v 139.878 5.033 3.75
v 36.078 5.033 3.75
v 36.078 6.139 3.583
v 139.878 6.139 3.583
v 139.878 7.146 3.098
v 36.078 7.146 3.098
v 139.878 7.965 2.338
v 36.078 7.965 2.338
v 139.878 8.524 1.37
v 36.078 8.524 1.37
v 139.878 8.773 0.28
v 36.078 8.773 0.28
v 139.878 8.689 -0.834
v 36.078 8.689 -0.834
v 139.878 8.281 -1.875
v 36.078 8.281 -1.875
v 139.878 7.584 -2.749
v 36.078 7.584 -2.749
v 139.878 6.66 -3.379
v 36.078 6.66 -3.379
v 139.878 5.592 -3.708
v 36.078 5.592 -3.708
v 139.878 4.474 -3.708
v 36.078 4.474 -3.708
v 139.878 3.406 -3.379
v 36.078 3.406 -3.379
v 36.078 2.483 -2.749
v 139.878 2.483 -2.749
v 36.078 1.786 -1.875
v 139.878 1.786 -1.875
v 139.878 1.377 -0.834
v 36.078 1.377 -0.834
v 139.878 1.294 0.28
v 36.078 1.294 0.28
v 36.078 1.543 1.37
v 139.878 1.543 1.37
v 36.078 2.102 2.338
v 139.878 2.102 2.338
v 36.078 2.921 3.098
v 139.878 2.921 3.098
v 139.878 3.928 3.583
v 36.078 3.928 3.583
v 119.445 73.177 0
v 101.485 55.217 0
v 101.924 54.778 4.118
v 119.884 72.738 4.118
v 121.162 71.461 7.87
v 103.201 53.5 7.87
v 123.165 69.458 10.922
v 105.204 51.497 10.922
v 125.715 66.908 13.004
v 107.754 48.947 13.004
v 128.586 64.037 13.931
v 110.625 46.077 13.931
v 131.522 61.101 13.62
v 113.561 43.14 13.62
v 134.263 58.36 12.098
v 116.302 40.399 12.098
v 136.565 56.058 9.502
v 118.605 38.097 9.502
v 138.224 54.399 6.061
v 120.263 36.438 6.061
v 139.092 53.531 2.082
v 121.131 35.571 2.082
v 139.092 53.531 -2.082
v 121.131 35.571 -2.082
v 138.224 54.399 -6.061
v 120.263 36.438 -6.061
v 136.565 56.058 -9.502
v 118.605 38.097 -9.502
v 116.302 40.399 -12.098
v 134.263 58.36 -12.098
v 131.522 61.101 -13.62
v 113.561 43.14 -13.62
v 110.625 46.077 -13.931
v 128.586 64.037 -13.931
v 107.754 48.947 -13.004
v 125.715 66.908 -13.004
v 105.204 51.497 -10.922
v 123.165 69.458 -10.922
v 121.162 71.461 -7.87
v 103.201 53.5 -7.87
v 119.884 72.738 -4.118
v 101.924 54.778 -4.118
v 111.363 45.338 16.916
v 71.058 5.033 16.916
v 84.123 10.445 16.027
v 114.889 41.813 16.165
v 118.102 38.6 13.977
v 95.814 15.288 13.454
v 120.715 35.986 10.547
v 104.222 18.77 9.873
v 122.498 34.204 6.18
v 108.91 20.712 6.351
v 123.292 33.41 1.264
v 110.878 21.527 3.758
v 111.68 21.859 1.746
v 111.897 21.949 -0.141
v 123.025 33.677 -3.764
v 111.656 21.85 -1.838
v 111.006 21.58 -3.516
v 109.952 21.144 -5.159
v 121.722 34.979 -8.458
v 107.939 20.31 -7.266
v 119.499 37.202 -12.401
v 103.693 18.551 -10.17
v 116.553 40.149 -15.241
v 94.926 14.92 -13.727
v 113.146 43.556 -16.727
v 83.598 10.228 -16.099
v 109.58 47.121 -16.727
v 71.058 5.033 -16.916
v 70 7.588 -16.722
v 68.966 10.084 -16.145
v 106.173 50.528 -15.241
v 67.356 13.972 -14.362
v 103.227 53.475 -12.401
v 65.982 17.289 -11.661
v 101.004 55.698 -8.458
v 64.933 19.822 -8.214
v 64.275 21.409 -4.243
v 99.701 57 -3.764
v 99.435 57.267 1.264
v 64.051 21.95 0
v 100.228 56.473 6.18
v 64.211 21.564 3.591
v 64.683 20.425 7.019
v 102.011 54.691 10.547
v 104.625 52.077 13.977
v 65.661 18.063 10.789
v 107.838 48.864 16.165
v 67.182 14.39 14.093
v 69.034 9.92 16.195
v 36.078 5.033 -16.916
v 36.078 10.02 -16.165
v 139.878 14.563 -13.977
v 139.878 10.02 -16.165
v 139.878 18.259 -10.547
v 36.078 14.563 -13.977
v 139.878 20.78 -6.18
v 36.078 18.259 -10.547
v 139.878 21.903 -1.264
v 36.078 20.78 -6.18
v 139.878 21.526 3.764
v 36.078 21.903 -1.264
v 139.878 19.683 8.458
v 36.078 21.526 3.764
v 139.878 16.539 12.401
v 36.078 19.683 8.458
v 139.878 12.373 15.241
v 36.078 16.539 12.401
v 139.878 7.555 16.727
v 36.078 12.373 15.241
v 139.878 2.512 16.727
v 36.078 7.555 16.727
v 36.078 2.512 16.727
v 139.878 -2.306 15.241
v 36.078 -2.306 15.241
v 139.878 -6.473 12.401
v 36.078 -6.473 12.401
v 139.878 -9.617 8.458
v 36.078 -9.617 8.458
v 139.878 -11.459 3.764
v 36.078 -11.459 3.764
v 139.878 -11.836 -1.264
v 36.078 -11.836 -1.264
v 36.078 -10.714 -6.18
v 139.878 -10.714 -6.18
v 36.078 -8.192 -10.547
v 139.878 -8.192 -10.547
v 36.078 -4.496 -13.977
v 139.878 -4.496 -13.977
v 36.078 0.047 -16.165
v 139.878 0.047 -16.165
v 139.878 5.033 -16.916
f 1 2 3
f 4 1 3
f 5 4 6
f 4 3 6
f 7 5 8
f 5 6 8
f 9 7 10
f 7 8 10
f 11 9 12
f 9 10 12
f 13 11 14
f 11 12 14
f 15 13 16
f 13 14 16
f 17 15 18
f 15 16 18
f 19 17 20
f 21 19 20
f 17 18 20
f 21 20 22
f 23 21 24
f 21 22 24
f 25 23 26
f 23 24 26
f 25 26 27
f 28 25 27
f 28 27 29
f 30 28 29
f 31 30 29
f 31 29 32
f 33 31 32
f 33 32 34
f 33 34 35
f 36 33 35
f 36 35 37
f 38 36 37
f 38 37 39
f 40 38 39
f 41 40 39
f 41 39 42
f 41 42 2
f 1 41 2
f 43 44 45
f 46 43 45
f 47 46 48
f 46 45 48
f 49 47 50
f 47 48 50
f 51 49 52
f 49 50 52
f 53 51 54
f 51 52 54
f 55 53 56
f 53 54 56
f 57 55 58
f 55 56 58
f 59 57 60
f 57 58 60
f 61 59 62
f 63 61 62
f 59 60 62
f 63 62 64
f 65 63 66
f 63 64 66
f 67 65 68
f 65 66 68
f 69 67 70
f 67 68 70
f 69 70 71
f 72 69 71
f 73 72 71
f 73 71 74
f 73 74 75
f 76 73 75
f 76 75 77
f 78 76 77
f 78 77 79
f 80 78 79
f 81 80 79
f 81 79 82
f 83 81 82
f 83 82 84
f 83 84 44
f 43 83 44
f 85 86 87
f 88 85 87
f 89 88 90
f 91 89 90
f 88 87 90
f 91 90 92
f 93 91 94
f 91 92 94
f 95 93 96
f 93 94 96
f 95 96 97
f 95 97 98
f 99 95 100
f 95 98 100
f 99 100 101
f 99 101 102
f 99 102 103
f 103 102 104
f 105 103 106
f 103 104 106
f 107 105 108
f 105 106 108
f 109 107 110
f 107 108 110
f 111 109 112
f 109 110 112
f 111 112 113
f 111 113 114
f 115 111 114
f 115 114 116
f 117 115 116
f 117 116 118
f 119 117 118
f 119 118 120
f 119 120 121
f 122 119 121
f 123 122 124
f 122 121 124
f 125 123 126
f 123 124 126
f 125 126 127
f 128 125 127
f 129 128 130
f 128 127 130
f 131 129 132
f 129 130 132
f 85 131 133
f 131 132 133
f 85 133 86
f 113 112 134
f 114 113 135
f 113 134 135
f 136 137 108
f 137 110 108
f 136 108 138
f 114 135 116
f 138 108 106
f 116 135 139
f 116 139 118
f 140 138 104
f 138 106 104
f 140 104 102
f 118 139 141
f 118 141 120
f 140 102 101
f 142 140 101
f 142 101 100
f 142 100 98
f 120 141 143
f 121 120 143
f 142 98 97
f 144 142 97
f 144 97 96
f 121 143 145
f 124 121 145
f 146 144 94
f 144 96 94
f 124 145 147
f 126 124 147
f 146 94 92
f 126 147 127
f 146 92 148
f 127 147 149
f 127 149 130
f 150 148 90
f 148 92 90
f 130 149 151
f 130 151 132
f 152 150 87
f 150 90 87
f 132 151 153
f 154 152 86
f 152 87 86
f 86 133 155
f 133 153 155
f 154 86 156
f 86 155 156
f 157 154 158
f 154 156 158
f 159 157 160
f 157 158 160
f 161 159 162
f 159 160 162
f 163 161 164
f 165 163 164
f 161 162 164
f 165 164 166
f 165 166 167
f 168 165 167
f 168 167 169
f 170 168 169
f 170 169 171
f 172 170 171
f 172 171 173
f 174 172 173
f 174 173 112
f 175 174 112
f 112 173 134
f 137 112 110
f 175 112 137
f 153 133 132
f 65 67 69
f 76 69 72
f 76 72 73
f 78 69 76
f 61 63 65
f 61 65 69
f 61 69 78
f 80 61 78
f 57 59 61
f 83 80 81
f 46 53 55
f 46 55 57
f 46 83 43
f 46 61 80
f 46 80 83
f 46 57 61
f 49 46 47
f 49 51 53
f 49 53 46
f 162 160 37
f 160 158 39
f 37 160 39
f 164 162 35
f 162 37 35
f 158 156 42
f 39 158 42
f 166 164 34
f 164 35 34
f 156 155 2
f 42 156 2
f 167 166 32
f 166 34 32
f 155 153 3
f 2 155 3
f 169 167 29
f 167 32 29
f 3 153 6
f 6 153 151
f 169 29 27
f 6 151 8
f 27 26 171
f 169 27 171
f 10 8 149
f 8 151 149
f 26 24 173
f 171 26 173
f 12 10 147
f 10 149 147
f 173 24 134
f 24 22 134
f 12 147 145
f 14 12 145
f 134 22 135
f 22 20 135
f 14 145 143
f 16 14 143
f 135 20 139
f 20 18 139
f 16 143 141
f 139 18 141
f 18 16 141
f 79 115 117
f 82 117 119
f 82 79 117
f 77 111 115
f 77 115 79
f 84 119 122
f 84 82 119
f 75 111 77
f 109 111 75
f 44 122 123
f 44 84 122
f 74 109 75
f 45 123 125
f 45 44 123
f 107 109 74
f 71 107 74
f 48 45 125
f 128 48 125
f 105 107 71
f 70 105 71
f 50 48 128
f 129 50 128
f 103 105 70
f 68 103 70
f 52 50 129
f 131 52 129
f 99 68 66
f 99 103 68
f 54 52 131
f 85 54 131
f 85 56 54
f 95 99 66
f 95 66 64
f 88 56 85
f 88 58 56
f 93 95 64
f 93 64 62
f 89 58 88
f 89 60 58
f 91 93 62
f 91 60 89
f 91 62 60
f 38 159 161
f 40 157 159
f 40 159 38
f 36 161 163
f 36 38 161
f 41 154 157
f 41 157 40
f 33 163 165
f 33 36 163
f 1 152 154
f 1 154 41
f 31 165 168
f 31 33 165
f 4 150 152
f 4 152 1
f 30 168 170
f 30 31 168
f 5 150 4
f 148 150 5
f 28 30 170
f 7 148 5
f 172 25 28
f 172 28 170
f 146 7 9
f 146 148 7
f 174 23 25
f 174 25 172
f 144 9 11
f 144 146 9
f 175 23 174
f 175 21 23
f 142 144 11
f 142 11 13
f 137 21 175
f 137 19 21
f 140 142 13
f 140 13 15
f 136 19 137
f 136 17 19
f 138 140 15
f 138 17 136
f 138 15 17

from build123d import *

# Parameters (mm, degrees)
SKETCH1_R           = 28.194
BOSS_EXTRUDE1_DEPTH = 173
SKETCH5_R           = 28.194
BOSS_EXTRUDE3_DEPTH = 95
SKETCH7_R           = 6.25
CUT_EXTRUDE1_DEPTH  = 369.4
SCALE2_SCALE        = 0.6
SKETCH9_R           = 13.97
BOSS_EXTRUDE4_DEPTH = 25.4


with BuildPart() as part:
    # Sketch1 → Boss-Extrude1 (new body)
    with BuildSketch(Plane(origin=(0, 0, 0), x_dir=(0, 0, -1), z_dir=(1, 0, 0))):
        Circle(SKETCH1_R)
    extrude(amount=BOSS_EXTRUDE1_DEPTH)

    # Sketch5 → Boss-Extrude3 (add)
    with BuildSketch(Plane(origin=(29.15, 29.15, 0), x_dir=(0.7071067811865464, -0.7071067811865488, 0), z_dir=(0.7071067811865488, 0.7071067811865464, 0))):
        with Locations(Location((41.224325343, 0, 0), (0, 0, 270))):
            Circle(SKETCH5_R)
    extrude(amount=BOSS_EXTRUDE3_DEPTH)

    # Sketch7 → Cut-Extrude1 (cut)
    with BuildSketch(Plane.ZY):
        Circle(SKETCH7_R)
    extrude(amount=-CUT_EXTRUDE1_DEPTH, mode=Mode.SUBTRACT)


with BuildPart() as part_1:
    # Scale2: scaled about (90.195479619, 12.583516577, 0)
    add(part.part.scale(SCALE2_SCALE).moved(Location((36.078191848, 5.033406631, 0))))

    # Sketch9 → Boss-Extrude4 (add)
    with BuildSketch(Plane(origin=(78.350854573, 78.350854573, 0), x_dir=(0, 0, -1), z_dir=(0.7071067811865487, 0.7071067811865465, 0))):
        with Locations(Location((7.4118e-05, -46.686589237, 0), (0, 0, 90))):
            Circle(SKETCH9_R)
    extrude(amount=BOSS_EXTRUDE4_DEPTH)


solid = part_1.part
